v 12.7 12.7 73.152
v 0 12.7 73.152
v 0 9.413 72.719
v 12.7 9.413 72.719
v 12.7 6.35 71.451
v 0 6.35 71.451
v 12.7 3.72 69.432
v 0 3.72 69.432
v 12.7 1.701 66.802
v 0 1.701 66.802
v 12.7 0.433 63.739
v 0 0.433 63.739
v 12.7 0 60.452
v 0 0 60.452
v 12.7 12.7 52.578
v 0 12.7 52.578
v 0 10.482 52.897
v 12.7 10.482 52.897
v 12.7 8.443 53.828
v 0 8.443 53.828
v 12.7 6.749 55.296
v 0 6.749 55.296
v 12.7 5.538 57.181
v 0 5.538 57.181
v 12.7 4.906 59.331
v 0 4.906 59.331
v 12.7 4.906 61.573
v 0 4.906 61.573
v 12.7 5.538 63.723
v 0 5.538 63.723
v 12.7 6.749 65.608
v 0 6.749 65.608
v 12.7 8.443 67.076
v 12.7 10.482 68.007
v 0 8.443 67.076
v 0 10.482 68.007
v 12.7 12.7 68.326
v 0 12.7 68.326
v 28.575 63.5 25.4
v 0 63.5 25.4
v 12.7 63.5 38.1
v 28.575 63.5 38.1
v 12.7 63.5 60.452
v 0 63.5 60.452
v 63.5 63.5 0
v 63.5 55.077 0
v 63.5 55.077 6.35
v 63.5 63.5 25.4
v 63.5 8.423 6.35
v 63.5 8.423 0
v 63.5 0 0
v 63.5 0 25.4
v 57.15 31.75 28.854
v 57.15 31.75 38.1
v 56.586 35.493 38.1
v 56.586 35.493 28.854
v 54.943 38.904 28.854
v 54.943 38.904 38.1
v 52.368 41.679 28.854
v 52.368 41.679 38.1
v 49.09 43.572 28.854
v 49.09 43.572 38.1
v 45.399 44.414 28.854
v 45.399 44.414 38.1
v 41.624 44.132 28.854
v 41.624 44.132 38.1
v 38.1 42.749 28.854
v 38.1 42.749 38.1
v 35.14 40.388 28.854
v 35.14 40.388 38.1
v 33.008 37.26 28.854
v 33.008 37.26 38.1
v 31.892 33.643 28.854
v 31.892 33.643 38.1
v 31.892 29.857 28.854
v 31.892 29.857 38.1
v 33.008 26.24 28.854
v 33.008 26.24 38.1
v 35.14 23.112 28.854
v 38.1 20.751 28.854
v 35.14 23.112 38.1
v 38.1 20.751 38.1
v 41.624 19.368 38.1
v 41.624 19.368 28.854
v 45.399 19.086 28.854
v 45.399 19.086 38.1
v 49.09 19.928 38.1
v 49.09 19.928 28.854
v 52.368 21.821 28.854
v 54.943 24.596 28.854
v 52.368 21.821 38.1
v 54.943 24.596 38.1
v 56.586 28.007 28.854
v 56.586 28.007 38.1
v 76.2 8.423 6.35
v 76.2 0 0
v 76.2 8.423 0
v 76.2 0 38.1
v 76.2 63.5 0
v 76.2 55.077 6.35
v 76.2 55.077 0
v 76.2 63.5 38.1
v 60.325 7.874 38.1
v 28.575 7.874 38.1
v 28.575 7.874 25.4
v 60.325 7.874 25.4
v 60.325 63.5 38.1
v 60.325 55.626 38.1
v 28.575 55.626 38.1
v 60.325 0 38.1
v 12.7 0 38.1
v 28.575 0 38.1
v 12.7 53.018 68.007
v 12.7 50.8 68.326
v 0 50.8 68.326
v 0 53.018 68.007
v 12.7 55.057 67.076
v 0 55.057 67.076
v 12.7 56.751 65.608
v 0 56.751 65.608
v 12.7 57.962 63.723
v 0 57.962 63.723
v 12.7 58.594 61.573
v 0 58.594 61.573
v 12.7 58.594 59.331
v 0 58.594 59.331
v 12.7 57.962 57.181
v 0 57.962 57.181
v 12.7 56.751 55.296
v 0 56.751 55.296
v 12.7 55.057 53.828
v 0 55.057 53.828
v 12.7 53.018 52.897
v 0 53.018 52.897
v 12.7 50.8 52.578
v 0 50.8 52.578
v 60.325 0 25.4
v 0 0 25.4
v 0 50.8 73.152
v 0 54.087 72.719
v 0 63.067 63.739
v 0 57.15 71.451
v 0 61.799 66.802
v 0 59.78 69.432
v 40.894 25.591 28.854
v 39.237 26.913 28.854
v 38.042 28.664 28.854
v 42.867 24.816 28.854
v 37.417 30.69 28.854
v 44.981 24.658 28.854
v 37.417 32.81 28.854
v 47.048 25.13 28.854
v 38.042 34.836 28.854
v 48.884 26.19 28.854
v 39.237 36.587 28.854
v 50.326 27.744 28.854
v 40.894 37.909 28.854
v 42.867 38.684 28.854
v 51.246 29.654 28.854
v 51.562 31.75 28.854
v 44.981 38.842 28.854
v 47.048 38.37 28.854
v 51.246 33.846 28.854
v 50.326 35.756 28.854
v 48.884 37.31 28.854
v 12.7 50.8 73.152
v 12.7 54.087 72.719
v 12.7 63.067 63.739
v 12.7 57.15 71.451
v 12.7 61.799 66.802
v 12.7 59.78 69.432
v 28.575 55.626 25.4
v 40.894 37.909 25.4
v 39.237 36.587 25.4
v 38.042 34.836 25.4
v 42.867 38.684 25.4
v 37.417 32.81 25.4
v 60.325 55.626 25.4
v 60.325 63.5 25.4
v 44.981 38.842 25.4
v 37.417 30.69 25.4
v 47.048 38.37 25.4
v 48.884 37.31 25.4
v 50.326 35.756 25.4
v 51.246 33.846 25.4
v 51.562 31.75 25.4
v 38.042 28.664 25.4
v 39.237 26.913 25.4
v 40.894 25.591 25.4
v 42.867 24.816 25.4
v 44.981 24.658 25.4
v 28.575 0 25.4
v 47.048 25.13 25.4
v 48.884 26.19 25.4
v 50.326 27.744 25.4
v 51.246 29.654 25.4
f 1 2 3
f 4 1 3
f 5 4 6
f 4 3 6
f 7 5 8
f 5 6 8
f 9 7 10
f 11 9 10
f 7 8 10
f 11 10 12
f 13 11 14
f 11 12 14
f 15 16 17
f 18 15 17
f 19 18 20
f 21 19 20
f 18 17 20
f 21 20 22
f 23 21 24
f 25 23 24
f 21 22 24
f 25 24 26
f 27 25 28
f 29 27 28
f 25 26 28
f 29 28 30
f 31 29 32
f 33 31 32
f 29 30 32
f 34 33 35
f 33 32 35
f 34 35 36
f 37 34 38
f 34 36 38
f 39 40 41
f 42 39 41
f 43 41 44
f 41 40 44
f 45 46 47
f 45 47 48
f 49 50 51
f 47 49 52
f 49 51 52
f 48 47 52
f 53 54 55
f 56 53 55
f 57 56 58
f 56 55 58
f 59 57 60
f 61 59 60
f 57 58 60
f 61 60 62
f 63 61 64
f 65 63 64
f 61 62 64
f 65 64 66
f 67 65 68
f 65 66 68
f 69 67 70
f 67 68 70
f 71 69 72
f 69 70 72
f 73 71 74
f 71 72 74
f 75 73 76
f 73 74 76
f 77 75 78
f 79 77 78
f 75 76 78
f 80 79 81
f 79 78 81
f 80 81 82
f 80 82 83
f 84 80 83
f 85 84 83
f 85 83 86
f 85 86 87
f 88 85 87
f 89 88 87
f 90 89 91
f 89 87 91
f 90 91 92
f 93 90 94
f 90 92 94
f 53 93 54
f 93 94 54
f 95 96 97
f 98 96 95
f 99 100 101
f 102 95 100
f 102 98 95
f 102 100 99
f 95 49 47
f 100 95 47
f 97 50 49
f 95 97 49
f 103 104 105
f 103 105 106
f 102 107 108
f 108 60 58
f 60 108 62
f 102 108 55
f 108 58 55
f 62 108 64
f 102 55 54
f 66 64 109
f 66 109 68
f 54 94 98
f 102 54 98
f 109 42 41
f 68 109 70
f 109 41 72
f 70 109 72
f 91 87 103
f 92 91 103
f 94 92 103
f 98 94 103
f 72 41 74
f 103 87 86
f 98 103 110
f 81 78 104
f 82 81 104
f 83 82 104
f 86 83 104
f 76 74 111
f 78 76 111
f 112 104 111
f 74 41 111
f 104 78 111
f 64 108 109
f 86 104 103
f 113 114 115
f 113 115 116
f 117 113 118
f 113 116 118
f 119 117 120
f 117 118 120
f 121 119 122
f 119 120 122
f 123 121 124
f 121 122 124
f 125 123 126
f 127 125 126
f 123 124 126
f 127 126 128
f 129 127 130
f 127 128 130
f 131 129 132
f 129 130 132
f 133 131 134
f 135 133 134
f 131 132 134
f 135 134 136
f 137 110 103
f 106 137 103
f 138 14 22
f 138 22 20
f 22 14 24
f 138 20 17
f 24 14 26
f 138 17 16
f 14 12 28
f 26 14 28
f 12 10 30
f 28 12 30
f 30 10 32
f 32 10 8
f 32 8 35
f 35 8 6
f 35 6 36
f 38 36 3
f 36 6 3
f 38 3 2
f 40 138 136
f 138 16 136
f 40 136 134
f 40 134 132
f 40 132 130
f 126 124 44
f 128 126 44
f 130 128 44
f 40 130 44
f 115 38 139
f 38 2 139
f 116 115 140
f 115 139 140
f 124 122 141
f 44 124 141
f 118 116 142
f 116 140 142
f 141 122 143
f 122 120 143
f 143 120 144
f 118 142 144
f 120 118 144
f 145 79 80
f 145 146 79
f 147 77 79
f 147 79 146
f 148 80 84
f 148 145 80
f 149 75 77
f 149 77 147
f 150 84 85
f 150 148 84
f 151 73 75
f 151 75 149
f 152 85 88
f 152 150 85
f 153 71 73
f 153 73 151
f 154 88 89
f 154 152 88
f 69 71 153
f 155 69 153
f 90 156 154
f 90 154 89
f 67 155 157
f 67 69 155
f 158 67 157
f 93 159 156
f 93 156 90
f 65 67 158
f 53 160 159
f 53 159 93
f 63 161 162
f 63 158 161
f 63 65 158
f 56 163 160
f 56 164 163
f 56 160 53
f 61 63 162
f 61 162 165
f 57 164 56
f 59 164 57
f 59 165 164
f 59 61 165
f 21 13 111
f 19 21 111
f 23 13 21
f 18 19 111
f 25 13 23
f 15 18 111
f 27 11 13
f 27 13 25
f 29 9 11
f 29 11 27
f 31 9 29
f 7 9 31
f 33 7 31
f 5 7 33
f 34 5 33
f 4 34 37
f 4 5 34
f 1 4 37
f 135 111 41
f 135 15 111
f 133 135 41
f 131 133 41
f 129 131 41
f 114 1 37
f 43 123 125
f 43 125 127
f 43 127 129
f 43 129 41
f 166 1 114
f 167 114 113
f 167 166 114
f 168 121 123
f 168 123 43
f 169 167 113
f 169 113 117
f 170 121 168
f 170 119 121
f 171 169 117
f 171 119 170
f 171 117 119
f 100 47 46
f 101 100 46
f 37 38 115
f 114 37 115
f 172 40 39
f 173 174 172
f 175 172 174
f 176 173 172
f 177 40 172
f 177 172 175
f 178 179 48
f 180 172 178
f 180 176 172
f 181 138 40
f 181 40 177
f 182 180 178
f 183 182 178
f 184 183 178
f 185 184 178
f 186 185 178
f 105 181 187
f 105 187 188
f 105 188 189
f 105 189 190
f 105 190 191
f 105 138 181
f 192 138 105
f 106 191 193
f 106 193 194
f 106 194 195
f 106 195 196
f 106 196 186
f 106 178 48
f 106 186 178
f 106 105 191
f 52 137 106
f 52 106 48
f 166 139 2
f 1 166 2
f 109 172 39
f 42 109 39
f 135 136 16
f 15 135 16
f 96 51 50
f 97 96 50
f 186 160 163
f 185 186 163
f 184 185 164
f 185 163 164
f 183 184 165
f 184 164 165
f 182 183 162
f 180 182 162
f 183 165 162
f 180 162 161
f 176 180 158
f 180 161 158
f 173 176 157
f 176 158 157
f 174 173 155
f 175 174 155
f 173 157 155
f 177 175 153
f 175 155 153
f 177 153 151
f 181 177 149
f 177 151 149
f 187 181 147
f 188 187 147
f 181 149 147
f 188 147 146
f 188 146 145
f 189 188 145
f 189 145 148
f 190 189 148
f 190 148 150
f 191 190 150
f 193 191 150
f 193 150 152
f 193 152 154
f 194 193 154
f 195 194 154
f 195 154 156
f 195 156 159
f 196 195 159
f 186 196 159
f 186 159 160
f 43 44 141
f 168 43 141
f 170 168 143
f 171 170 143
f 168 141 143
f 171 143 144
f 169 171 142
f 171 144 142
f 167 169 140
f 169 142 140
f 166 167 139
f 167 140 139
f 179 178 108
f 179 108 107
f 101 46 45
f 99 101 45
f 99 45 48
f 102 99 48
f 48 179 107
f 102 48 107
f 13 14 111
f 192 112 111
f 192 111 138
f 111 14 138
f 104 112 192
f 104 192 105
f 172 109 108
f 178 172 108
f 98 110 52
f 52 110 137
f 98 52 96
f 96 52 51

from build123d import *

# Parameters (mm, degrees)
F1_DEPTH = 12.7
F2_DEPTH = 76.2
F3_R     = 12.7
F3_R_2   = 7.112
F4_DEPTH = 9.2456
F5_DEPTH = 38.101
F3_W     = 31.75
F3_H     = 7.874
F6_DEPTH = 38.101
F7_W     = 63.5
F7_H     = 25.4
F8_DEPTH = 63.501


with BuildPart() as f1:
    # F0 (on Right) → F1 (new body)
    with BuildSketch(Plane.YZ):
        with BuildLine():
            Line((0, 60.452), (0, 38.1))
            Line((0, 38.1), (63.5, 38.1))
            Line((63.5, 38.1), (63.5, 60.452))
            ThreePointArc((63.5, 60.452), (59.780256, 69.432256), (50.8, 73.152))
            Line((50.8, 73.152), (12.7, 73.152))
            ThreePointArc((12.7, 73.152), (3.719744, 69.432256), (0, 60.452))
        make_face()
        with BuildLine():
            ThreePointArc((12.7, 52.578), (4.826, 60.452), (12.7, 68.326))
            Line((12.7, 68.326), (50.8, 68.326))
            ThreePointArc((50.8, 68.326), (58.674, 60.452), (50.8, 52.578))
            Line((50.8, 52.578), (12.7, 52.578))
        make_face(mode=Mode.SUBTRACT)
    extrude(amount=F1_DEPTH)

    # F0 (on Right) → F2 (join)
    with BuildSketch(Plane.YZ):
        Polygon((0, 38.1), (0, 0), (8.423471, 0), (8.423471, 6.35), (55.076529, 6.35), (55.076529, 0), (63.5, 0), (63.5, 38.1), align=None)
    extrude(amount=F2_DEPTH)

    # F3 (on face) → F4 (cut)
    with BuildSketch(Plane.XY.offset(38.1)):
        with Locations((44.45, 31.75)):
            Circle(F3_R)
        with Locations((44.45, 31.75)):
            Circle(F3_R_2, mode=Mode.SUBTRACT)
    extrude(amount=-F4_DEPTH, mode=Mode.SUBTRACT)

    # F3 (on face) → F5 (cut, through all)
    with BuildSketch(Plane.XY.offset(38.1)):
        with Locations((44.45, 31.75)):
            Circle(F3_R_2)
    extrude(amount=-F5_DEPTH, mode=Mode.SUBTRACT)

    # F3 (on face) → F6 (cut, through all)
    with BuildSketch(Plane.XY.offset(38.1)):
        with Locations((44.45, 59.563)):
            Rectangle(F3_W, F3_H)
        with Locations((44.45, 3.937)):
            Rectangle(F3_W, F3_H)
    extrude(amount=-F6_DEPTH, mode=Mode.SUBTRACT)

    # F7 (on face) → F8 (cut, through all)
    with BuildSketch(Plane.XZ):
        with Locations((31.75, 12.7)):
            Rectangle(F7_W, F7_H)
    extrude(amount=-F8_DEPTH, mode=Mode.SUBTRACT)


solid = f1.part
